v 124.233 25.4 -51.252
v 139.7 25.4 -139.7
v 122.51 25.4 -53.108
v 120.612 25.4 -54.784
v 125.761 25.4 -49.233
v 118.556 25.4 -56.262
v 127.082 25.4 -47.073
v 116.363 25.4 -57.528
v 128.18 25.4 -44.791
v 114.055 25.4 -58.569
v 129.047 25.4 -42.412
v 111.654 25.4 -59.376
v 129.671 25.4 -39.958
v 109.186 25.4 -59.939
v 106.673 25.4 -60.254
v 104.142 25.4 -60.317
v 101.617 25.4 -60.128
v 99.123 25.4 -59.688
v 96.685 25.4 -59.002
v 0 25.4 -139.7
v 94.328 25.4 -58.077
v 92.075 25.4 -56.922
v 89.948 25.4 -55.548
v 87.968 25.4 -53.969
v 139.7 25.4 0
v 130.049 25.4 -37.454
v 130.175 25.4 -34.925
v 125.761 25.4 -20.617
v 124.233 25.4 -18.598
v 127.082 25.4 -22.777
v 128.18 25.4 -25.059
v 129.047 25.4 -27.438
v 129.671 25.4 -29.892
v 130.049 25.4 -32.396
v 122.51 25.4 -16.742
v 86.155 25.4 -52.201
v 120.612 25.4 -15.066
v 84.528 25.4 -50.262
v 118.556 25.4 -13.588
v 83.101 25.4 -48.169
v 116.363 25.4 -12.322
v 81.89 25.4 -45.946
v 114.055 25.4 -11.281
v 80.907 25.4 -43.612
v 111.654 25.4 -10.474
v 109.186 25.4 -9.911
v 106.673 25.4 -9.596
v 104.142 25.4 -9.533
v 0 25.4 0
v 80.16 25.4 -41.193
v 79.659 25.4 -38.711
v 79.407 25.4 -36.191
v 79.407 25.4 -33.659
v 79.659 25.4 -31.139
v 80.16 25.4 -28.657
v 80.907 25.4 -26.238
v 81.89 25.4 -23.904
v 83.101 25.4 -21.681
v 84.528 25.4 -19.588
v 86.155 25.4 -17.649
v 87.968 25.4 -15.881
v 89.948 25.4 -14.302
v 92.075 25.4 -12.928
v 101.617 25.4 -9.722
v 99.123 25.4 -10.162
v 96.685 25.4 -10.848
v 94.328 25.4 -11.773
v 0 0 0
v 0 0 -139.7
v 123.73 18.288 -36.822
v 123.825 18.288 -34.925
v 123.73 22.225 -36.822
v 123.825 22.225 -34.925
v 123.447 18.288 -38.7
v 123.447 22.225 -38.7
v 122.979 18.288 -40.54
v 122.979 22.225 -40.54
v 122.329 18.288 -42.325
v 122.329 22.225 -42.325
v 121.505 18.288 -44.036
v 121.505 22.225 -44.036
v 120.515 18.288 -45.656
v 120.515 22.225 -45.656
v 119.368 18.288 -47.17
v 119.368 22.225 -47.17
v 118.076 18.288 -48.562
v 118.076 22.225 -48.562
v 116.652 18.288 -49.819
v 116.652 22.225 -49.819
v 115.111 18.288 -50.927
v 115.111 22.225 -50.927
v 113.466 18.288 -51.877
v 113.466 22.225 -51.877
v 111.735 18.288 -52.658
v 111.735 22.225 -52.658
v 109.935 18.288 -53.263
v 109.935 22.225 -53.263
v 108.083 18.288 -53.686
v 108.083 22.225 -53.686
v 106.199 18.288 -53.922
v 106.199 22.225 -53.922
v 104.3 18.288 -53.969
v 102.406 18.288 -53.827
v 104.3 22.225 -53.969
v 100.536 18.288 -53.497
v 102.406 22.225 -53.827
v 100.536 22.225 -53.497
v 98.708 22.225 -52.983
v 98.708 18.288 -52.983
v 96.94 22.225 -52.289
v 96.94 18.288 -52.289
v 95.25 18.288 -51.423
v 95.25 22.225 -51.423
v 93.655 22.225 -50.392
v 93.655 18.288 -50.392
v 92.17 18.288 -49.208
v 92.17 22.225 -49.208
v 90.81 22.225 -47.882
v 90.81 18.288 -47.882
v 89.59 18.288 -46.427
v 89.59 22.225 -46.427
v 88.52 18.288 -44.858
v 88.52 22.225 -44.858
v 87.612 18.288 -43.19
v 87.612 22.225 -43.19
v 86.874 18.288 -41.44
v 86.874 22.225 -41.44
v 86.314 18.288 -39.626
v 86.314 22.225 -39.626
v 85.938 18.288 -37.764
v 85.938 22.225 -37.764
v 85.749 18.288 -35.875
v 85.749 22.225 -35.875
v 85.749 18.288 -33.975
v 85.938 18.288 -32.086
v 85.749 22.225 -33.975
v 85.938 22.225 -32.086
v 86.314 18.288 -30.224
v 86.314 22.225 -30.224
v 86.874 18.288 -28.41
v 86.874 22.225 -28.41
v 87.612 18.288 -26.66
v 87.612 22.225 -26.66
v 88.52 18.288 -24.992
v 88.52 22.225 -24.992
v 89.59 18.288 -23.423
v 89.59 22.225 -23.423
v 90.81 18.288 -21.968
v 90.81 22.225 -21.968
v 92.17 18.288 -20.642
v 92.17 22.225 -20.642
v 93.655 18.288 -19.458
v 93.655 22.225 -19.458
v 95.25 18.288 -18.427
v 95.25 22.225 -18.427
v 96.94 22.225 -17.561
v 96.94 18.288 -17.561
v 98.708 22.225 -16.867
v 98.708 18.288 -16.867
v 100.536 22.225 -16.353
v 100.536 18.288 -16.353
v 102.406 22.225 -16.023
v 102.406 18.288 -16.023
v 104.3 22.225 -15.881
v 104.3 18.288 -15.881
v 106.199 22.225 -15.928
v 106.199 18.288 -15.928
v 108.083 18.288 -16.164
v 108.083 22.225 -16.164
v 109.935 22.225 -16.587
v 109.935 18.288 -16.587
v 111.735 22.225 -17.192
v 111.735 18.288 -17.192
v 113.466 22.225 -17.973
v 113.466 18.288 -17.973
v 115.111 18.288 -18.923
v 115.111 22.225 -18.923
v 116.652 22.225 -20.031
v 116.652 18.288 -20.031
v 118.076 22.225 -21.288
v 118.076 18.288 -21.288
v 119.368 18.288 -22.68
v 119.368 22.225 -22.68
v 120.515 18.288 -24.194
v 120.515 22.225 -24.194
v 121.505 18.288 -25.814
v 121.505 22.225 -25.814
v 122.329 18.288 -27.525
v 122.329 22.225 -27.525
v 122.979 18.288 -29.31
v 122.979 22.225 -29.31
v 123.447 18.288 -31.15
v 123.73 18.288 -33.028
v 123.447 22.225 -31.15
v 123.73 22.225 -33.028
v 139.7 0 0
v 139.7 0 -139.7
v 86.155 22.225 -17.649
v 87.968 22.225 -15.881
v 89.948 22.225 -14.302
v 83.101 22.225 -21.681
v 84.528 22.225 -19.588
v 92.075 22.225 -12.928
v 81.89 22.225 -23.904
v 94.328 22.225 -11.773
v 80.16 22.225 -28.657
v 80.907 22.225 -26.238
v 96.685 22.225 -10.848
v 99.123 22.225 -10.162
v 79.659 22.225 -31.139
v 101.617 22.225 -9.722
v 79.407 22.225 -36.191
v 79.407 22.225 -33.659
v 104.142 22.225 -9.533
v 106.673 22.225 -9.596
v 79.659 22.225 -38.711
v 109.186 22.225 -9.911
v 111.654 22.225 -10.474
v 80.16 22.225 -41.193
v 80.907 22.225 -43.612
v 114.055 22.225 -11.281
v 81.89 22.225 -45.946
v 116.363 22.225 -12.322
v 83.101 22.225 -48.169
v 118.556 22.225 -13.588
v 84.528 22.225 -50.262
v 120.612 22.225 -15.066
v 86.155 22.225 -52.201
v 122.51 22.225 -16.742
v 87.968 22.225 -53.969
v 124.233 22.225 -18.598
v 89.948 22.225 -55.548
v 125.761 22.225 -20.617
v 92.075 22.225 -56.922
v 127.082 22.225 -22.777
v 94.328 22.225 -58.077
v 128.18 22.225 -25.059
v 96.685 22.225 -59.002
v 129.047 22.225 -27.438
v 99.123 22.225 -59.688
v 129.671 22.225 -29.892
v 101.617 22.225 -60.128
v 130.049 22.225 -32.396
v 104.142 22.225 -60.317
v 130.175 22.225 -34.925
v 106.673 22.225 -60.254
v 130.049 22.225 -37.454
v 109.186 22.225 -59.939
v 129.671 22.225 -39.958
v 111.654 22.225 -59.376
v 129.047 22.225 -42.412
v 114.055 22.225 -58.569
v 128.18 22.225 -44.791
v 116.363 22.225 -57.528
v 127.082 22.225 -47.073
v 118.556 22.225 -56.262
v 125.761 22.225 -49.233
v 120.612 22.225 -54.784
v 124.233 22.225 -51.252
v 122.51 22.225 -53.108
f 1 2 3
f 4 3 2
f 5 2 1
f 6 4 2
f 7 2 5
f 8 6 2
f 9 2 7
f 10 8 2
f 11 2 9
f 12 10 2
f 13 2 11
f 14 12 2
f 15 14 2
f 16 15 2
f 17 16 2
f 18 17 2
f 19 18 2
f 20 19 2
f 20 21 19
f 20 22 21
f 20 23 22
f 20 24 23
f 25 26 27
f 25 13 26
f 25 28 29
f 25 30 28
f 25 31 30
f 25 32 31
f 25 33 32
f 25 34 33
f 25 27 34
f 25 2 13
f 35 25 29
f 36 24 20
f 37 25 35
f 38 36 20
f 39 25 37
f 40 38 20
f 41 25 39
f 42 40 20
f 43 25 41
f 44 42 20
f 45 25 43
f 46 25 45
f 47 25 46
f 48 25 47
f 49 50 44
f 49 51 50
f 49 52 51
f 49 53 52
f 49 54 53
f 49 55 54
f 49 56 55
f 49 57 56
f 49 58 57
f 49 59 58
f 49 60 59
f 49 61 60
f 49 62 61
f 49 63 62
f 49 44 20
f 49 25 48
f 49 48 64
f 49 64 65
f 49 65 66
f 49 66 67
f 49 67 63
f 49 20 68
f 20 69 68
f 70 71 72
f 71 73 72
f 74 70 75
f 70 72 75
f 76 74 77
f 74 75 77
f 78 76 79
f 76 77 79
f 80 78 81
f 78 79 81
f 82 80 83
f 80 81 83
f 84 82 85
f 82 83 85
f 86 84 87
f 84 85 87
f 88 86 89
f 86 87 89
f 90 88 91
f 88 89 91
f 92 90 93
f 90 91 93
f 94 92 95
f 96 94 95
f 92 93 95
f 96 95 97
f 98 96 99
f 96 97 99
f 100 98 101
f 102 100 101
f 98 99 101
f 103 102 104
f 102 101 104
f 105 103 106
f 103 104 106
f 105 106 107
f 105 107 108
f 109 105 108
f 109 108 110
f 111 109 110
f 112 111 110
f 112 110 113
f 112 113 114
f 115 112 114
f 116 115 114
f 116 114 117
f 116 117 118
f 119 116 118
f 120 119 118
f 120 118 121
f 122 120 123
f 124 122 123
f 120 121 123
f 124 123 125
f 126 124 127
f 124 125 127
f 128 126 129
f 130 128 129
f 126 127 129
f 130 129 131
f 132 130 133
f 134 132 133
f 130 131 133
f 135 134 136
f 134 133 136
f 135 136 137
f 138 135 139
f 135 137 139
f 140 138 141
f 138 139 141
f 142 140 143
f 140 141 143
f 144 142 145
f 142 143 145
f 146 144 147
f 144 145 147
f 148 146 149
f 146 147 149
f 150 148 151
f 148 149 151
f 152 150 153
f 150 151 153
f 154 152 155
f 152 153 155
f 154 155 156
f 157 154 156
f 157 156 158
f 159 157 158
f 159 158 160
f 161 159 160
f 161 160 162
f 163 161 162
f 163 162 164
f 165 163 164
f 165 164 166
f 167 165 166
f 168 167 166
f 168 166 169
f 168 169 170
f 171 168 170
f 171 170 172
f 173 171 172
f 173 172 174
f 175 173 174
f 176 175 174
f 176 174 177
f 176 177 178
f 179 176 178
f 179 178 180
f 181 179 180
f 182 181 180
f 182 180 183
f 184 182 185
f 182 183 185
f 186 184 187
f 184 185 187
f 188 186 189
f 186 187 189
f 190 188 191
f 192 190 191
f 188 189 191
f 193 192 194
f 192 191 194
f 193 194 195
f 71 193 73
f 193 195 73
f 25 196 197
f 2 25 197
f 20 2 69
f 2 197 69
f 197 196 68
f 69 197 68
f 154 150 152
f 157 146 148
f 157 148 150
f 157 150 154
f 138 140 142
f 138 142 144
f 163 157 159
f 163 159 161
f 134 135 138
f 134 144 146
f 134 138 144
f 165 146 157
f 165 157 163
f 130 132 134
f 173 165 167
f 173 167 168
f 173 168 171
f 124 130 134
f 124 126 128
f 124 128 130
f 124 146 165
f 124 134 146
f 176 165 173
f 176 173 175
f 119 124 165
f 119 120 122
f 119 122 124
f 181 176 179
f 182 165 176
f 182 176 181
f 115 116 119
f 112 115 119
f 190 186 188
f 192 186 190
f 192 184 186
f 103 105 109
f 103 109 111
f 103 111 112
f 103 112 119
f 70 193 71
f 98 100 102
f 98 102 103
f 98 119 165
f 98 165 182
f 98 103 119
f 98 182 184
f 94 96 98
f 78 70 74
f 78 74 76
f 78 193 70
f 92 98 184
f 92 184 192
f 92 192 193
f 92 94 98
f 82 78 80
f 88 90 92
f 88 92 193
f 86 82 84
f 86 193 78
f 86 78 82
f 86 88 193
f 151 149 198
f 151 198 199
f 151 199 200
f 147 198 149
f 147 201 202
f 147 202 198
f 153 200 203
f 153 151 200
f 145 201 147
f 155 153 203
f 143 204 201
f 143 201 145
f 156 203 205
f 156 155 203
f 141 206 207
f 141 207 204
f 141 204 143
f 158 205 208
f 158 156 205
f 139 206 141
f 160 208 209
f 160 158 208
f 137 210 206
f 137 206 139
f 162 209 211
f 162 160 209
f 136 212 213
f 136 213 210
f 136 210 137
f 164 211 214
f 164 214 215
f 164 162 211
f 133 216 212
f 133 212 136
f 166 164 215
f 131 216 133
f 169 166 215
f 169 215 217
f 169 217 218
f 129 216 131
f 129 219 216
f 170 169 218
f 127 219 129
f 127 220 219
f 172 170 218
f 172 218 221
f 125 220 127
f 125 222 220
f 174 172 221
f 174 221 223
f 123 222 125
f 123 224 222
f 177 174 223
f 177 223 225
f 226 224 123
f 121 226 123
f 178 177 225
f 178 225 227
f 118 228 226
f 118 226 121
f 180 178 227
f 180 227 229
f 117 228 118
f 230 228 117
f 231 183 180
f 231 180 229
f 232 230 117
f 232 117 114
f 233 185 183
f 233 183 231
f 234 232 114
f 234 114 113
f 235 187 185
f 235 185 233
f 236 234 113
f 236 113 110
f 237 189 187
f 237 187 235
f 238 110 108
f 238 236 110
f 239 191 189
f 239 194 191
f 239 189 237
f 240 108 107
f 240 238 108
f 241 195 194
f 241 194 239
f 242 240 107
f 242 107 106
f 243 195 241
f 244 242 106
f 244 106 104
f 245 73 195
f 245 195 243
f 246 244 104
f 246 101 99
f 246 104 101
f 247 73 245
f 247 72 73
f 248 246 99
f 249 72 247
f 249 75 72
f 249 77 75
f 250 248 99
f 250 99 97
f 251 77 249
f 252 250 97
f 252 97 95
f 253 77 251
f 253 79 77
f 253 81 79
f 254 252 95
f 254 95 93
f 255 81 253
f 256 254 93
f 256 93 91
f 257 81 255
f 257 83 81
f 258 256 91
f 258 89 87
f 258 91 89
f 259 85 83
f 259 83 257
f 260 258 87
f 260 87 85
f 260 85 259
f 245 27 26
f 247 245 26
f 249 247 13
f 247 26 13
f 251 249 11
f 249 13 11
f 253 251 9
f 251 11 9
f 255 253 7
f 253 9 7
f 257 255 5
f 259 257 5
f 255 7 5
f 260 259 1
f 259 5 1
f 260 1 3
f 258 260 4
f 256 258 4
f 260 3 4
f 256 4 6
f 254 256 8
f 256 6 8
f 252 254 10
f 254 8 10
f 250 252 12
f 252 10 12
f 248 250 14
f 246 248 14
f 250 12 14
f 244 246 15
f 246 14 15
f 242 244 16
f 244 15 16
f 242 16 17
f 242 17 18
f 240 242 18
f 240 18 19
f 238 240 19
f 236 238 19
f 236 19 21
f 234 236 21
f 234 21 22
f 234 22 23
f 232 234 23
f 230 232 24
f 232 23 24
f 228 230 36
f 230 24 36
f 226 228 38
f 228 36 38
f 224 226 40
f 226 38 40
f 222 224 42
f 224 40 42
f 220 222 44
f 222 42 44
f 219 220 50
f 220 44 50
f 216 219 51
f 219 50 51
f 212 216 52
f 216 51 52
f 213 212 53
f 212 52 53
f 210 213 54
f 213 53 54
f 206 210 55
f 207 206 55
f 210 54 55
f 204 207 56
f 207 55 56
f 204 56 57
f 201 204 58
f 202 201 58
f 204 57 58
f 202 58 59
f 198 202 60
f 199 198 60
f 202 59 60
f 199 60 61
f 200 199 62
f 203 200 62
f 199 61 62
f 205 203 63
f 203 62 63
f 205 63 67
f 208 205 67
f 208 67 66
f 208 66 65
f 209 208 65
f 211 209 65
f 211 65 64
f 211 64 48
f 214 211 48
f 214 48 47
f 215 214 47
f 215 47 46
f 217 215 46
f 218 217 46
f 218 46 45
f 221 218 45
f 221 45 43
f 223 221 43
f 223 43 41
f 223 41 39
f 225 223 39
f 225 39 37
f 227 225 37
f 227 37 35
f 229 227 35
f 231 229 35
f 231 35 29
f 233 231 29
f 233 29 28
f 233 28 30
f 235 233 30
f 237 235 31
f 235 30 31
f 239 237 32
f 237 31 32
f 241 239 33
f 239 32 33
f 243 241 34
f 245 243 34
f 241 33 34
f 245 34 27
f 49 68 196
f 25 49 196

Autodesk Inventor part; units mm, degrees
ref_plane "YZ Plane" through (0, 0, 0) normal (1, 0, 0) x (0, 1, 0)
ref_plane "XZ Plane" through (0, 0, 0) normal (0, 1, 0) x (-1, 0, 0)
ref_plane "XY Plane" through (0, 0, 0) normal (0, 0, 1) x (1, 0, 0)
sketch "Sketch1" plane through (0, 0, 0) normal (0, 1, 0) x (-1, 0, 0)
  line L0 (0, 0) -> (-139.7, 0)
  line L1 (-139.7, 0) -> (-139.7, -139.7)
  line L2 (-139.7, -139.7) -> (0, -139.7)
  line L3 (0, -139.7) -> (0, 0)
  dimension "d0" = 139.7
  dimension "d1" = 139.7
extrude "Extrusion1" add sketch "Sketch1" along normal blind 25.4
sketch "Sketch2" plane through (0, 25.4, 0) normal (0, 1, 0) x (1, 0, 0)
  circle A0 centre (104.775, 34.925) radius 25.4
  line L0 (0, 0) -> (139.7, 0) projected
  line L1 (139.7, 0) -> (139.7, 139.7) projected
  line L2 (139.7, 139.7) -> (0, 139.7) projected
  line L3 (0, 139.7) -> (0, 0) projected
  dimension "d4" = 50.8
  dimension "d5" = 34.925
  dimension "d6" = 34.925
extrude "Extrusion2" cut sketch "Sketch2" against normal blind 3.175 contours A0
sketch "Sketch3" plane through (104.775, 22.225, -34.925) normal (0, 1, 0) x (1, 0, 0)
  circle A0 centre (0, 0) radius 19.05
  point P0 (-104.775, -34.925)
  dimension "d9" = 38.1
extrude "Extrusion3" cut sketch "Sketch3" against normal blind 3.937
equation "\"d5\" = d6"
properties part number "Saber plaque"
